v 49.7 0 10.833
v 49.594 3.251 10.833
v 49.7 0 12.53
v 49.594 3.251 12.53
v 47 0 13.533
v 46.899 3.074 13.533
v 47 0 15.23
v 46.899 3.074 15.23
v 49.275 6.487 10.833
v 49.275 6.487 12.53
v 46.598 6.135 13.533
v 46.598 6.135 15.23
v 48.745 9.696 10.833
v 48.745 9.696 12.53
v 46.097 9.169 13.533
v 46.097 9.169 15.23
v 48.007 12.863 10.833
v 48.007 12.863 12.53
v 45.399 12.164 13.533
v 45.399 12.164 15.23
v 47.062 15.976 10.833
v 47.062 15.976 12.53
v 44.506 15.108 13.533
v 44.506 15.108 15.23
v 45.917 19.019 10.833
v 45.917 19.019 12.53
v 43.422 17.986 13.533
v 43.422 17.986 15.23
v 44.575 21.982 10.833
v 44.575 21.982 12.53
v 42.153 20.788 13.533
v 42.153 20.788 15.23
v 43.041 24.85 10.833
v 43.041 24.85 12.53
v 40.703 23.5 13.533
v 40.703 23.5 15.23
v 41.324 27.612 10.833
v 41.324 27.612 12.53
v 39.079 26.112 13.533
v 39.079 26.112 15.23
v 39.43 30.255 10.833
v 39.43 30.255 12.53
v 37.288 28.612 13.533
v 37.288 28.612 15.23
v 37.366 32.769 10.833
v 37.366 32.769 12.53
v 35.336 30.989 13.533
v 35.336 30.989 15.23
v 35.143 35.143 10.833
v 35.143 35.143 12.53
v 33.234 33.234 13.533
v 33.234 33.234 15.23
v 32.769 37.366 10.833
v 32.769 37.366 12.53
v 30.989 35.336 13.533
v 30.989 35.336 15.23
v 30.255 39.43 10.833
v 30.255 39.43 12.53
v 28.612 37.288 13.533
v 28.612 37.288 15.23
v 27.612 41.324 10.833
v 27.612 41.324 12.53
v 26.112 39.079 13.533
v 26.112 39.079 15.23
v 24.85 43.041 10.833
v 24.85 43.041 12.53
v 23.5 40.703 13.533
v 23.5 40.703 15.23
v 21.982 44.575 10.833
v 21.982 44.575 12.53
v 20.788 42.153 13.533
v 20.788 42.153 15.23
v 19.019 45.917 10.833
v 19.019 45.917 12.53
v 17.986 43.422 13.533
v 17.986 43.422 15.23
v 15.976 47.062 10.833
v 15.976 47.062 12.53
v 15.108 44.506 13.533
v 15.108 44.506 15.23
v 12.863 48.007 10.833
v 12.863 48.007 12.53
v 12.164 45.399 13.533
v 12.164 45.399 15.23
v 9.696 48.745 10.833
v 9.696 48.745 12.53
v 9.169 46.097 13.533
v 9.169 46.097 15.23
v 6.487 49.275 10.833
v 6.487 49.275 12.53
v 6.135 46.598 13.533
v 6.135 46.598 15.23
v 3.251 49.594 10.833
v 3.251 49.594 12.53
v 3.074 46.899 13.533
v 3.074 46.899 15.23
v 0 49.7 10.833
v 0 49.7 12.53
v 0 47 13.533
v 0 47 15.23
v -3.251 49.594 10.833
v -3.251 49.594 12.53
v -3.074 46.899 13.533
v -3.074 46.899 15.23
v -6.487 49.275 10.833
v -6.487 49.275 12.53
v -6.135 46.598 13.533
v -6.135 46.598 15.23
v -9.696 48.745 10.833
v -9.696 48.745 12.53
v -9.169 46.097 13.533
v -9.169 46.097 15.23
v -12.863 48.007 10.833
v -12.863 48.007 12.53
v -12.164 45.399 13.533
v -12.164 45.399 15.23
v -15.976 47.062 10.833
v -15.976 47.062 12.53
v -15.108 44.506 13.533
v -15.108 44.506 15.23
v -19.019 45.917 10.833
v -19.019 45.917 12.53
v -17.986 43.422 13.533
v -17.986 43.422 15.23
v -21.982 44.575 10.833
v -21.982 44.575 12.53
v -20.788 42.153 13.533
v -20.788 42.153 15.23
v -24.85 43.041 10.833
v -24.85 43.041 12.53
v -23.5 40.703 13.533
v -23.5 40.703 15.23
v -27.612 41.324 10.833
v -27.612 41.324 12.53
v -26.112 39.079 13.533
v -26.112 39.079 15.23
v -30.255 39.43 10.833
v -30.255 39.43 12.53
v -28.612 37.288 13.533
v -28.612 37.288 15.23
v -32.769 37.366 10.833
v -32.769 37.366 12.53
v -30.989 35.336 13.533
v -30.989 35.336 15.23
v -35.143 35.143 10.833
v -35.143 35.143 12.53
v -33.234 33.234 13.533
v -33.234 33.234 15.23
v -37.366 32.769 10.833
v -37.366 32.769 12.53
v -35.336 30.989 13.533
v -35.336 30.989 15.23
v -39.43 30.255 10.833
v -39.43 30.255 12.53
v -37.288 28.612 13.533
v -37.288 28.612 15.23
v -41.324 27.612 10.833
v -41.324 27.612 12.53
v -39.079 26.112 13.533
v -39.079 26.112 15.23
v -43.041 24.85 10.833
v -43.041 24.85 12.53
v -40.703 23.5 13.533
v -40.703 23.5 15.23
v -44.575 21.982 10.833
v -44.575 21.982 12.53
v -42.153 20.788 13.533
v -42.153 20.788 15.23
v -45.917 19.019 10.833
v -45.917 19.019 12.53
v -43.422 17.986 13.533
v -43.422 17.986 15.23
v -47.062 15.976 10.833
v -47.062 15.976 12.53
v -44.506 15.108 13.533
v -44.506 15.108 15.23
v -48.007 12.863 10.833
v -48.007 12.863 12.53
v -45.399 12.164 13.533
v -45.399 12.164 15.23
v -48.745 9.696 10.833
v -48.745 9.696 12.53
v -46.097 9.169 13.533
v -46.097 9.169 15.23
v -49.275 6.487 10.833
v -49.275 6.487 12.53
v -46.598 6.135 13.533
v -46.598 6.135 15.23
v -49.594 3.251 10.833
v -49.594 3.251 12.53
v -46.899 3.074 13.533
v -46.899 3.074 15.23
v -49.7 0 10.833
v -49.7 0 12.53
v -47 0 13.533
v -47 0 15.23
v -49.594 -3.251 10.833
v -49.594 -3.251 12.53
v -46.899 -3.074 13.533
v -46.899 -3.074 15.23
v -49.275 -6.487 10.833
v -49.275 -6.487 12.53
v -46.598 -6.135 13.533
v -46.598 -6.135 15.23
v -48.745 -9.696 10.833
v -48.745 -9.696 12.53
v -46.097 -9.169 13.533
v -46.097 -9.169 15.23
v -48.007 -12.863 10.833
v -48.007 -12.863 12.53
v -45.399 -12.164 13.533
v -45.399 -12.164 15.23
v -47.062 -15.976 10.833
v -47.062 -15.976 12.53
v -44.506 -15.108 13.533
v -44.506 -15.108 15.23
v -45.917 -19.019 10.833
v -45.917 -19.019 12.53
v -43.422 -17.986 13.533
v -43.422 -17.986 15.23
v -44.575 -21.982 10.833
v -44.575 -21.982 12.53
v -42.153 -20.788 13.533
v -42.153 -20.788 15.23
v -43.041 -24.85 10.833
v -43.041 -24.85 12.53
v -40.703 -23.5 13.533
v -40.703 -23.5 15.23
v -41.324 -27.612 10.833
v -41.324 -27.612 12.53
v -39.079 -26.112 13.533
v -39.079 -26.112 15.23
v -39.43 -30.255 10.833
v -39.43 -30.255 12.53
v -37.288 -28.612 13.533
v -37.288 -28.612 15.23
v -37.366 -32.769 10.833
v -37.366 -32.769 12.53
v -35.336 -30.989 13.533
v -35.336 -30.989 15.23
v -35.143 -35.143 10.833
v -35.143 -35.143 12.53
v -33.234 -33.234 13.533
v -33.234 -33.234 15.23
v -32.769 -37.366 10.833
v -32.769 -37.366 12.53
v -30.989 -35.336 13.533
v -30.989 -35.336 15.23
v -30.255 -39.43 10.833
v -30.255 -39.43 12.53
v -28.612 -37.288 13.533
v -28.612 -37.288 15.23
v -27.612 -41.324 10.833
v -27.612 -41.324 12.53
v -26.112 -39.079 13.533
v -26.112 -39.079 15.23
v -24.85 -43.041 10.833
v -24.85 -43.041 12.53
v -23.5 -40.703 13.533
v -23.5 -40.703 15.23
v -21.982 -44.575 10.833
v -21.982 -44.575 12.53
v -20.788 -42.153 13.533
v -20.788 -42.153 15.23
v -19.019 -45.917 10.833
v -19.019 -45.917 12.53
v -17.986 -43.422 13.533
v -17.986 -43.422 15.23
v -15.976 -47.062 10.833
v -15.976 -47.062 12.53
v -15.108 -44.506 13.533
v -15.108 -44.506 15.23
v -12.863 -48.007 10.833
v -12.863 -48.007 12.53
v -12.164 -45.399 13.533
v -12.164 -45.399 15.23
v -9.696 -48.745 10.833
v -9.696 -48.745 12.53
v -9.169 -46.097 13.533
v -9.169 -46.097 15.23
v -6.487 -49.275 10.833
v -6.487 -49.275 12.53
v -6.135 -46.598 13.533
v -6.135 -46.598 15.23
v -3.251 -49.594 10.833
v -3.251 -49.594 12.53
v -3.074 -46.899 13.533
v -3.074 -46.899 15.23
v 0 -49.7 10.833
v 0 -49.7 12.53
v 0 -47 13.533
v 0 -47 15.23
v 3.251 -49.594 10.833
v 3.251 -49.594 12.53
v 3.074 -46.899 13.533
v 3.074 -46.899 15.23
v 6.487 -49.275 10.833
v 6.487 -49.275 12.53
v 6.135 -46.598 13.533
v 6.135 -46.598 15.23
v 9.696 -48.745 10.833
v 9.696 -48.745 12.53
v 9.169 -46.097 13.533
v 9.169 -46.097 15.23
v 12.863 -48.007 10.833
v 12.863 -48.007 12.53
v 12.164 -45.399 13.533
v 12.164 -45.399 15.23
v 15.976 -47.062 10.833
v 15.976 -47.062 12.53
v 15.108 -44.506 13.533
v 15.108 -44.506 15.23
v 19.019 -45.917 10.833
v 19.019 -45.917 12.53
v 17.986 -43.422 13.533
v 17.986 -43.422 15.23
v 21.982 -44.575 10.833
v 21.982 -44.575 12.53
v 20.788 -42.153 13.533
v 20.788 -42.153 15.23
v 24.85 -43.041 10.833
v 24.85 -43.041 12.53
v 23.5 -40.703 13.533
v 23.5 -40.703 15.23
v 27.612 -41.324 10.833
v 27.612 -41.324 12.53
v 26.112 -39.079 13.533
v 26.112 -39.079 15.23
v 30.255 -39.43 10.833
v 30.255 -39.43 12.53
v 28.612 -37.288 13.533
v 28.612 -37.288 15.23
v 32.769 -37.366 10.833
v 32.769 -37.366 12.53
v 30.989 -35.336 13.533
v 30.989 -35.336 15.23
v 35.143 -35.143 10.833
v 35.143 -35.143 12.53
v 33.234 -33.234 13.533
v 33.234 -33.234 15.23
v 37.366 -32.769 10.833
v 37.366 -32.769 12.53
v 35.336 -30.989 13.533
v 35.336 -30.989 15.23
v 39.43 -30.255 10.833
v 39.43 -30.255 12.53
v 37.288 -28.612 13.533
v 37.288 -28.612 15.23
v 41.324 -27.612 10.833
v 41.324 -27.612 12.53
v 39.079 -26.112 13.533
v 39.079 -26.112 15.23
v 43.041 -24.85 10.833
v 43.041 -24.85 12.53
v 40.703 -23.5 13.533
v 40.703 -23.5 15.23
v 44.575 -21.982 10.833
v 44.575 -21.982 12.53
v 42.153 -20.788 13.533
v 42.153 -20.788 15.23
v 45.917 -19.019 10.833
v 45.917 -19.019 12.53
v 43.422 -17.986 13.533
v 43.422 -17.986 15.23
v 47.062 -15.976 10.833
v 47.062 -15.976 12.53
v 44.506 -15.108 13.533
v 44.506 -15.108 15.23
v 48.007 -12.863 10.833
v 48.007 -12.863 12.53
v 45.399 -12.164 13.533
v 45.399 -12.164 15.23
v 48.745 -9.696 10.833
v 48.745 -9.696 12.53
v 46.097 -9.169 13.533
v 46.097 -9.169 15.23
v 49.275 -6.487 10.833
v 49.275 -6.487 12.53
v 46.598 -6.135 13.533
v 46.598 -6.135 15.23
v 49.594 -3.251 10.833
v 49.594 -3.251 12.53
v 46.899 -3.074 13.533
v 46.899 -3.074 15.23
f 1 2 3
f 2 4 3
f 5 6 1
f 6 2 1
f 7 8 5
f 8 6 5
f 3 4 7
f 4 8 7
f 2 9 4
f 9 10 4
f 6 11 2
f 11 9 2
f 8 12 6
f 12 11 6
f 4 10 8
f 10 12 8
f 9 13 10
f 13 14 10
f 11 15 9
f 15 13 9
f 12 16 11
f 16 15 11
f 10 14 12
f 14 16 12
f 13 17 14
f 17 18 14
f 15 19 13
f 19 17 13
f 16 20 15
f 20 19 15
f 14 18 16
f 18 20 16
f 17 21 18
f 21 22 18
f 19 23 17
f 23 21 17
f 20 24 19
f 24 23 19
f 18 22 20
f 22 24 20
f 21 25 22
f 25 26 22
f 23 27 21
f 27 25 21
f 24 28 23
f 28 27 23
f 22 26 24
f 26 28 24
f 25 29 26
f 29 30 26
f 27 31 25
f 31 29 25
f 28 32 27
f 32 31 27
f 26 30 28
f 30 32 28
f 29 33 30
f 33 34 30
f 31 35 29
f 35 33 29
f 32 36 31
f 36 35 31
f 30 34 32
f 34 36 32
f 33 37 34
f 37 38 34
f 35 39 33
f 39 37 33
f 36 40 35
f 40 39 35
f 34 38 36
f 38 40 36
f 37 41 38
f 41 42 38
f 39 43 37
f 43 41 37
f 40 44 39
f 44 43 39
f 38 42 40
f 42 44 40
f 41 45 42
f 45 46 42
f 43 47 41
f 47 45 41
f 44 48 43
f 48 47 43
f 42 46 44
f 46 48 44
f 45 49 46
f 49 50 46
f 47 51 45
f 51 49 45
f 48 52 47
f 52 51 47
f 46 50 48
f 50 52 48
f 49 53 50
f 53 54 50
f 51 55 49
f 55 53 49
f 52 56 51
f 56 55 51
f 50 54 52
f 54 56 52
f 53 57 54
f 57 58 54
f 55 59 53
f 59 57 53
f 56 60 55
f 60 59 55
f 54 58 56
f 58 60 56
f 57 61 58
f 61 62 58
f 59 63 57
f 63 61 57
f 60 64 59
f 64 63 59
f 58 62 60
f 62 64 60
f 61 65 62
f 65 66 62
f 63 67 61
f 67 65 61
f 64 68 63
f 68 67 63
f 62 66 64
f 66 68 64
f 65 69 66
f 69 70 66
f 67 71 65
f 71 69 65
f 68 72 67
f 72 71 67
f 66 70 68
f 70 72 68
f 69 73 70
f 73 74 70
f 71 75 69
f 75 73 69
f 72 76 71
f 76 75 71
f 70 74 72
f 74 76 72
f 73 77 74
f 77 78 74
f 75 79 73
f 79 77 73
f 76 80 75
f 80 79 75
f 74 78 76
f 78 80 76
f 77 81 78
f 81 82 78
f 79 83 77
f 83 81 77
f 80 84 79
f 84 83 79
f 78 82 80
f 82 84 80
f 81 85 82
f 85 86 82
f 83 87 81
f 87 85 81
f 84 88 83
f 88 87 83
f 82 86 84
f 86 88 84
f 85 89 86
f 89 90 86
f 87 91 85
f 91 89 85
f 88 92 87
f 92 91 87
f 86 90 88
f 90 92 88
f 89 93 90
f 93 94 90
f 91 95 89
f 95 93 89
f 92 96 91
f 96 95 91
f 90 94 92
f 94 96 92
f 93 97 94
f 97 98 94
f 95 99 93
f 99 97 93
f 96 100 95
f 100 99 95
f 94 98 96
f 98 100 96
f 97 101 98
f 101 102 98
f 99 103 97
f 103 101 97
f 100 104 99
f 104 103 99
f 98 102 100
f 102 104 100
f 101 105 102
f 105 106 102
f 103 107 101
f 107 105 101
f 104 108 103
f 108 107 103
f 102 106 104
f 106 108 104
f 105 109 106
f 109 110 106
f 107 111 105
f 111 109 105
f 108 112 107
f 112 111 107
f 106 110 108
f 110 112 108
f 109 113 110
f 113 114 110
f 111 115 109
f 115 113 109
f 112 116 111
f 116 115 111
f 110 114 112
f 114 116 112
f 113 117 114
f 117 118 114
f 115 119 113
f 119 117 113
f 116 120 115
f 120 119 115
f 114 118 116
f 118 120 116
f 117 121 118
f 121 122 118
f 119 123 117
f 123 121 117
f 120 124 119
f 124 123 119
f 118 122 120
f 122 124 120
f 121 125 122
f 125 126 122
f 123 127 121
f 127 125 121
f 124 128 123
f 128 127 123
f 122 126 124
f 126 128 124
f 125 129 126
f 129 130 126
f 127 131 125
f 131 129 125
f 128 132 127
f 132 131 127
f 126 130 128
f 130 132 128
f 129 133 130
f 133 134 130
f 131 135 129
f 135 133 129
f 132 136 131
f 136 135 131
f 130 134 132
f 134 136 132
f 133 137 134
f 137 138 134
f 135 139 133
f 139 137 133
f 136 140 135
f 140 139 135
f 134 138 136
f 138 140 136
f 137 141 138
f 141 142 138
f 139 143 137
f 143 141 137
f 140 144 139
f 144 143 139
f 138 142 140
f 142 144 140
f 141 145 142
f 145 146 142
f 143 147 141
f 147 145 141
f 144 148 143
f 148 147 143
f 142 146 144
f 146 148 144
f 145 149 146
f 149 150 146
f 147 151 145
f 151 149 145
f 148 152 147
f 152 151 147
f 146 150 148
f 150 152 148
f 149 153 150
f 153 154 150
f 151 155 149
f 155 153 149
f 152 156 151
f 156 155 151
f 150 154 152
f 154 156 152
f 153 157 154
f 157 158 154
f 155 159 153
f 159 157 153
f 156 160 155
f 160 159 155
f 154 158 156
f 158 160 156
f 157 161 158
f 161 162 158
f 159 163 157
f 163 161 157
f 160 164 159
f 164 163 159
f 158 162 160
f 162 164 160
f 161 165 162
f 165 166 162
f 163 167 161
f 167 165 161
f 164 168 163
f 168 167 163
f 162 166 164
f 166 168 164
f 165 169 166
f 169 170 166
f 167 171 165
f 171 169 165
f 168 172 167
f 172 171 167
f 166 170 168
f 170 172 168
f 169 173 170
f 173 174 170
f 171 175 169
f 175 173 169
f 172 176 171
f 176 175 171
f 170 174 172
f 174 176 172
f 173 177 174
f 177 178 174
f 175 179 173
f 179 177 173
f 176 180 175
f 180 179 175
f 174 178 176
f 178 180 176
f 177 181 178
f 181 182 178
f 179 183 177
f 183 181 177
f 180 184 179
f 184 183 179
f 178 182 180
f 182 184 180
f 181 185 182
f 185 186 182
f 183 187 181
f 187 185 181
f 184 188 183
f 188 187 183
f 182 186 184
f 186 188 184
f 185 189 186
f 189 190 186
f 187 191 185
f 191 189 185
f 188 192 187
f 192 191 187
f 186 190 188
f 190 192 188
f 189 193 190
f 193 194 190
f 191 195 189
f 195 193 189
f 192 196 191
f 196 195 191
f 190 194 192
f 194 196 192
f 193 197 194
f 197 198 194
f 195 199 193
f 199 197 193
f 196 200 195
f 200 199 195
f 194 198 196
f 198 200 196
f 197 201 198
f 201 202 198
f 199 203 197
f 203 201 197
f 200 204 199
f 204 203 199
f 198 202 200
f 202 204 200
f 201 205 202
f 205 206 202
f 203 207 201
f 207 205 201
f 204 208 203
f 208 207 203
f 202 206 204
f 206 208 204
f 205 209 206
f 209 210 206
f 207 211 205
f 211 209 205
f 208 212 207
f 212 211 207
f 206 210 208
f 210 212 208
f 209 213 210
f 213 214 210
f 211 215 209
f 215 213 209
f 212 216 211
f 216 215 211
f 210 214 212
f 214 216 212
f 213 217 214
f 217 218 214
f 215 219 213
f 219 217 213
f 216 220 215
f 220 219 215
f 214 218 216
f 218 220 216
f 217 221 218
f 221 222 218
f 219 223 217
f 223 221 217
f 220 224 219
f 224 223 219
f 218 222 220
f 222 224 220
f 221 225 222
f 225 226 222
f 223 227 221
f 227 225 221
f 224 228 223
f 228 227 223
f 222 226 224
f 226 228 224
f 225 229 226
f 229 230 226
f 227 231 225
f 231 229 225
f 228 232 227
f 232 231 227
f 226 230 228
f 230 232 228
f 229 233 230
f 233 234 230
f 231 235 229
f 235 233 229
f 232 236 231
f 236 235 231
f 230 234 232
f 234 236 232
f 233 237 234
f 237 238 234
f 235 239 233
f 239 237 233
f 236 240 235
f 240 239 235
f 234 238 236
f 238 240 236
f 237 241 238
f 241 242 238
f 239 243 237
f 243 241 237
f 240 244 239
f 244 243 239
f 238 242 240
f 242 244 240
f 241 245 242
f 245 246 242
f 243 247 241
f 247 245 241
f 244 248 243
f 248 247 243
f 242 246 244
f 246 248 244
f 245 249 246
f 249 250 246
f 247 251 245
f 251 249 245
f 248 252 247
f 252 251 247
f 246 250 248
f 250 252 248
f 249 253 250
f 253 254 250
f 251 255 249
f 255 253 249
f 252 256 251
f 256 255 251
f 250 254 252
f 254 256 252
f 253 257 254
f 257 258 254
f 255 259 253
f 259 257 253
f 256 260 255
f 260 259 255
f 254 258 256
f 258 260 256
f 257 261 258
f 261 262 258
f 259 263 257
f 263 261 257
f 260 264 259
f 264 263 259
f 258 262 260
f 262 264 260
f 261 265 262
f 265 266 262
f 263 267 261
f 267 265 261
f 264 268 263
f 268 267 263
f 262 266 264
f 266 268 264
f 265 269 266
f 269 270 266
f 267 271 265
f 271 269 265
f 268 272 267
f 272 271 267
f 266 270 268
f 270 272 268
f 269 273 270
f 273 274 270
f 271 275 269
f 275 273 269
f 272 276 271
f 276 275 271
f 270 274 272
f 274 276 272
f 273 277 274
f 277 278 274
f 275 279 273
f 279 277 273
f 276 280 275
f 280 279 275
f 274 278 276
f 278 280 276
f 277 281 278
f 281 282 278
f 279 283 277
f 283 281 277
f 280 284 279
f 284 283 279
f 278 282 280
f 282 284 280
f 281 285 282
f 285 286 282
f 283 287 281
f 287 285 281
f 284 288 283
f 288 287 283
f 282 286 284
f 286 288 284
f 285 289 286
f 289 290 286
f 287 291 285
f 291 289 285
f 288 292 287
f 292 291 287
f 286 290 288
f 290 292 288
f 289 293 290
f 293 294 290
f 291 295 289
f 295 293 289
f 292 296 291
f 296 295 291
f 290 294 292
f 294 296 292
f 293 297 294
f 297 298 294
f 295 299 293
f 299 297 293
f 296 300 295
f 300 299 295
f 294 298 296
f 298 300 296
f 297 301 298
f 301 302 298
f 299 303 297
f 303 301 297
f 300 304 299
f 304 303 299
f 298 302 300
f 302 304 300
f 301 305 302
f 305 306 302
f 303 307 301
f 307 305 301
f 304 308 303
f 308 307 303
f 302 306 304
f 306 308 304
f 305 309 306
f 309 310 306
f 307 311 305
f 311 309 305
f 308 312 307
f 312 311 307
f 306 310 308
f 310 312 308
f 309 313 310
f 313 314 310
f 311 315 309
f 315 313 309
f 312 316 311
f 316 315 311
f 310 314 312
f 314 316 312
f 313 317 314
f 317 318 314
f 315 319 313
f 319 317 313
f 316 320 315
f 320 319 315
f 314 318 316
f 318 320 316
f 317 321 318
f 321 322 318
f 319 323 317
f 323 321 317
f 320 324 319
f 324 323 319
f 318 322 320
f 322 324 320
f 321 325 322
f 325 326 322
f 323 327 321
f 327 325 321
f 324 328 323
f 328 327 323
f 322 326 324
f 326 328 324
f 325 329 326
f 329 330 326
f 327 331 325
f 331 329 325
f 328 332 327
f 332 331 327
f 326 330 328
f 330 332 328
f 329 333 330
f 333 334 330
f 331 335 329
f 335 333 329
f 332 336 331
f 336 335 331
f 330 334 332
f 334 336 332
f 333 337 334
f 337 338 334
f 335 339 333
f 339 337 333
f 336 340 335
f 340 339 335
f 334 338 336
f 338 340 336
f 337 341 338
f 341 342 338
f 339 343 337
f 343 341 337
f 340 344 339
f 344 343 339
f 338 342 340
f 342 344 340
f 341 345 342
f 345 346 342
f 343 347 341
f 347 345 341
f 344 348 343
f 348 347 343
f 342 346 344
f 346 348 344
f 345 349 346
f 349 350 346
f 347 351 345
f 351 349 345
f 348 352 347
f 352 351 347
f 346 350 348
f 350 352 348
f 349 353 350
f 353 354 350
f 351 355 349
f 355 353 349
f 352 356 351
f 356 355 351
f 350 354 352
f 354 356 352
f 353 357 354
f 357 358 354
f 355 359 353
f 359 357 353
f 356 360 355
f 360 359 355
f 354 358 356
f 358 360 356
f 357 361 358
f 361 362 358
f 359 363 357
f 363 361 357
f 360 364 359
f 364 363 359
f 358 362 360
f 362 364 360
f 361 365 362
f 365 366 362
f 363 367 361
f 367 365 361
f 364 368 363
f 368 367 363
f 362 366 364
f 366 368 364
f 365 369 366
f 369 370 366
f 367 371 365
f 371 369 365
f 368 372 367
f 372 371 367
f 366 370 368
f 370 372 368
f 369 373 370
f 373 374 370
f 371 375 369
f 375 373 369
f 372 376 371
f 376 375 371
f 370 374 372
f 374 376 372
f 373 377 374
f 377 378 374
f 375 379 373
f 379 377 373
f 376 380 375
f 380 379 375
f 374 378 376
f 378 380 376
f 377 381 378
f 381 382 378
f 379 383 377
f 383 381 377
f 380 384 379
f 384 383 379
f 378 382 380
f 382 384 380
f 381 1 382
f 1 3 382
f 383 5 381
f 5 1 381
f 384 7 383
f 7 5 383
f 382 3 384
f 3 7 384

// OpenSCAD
include <../lib/servo-duct-manifold-lib.scad>;
$fn = 96;
spigot_adapter_gasket();
